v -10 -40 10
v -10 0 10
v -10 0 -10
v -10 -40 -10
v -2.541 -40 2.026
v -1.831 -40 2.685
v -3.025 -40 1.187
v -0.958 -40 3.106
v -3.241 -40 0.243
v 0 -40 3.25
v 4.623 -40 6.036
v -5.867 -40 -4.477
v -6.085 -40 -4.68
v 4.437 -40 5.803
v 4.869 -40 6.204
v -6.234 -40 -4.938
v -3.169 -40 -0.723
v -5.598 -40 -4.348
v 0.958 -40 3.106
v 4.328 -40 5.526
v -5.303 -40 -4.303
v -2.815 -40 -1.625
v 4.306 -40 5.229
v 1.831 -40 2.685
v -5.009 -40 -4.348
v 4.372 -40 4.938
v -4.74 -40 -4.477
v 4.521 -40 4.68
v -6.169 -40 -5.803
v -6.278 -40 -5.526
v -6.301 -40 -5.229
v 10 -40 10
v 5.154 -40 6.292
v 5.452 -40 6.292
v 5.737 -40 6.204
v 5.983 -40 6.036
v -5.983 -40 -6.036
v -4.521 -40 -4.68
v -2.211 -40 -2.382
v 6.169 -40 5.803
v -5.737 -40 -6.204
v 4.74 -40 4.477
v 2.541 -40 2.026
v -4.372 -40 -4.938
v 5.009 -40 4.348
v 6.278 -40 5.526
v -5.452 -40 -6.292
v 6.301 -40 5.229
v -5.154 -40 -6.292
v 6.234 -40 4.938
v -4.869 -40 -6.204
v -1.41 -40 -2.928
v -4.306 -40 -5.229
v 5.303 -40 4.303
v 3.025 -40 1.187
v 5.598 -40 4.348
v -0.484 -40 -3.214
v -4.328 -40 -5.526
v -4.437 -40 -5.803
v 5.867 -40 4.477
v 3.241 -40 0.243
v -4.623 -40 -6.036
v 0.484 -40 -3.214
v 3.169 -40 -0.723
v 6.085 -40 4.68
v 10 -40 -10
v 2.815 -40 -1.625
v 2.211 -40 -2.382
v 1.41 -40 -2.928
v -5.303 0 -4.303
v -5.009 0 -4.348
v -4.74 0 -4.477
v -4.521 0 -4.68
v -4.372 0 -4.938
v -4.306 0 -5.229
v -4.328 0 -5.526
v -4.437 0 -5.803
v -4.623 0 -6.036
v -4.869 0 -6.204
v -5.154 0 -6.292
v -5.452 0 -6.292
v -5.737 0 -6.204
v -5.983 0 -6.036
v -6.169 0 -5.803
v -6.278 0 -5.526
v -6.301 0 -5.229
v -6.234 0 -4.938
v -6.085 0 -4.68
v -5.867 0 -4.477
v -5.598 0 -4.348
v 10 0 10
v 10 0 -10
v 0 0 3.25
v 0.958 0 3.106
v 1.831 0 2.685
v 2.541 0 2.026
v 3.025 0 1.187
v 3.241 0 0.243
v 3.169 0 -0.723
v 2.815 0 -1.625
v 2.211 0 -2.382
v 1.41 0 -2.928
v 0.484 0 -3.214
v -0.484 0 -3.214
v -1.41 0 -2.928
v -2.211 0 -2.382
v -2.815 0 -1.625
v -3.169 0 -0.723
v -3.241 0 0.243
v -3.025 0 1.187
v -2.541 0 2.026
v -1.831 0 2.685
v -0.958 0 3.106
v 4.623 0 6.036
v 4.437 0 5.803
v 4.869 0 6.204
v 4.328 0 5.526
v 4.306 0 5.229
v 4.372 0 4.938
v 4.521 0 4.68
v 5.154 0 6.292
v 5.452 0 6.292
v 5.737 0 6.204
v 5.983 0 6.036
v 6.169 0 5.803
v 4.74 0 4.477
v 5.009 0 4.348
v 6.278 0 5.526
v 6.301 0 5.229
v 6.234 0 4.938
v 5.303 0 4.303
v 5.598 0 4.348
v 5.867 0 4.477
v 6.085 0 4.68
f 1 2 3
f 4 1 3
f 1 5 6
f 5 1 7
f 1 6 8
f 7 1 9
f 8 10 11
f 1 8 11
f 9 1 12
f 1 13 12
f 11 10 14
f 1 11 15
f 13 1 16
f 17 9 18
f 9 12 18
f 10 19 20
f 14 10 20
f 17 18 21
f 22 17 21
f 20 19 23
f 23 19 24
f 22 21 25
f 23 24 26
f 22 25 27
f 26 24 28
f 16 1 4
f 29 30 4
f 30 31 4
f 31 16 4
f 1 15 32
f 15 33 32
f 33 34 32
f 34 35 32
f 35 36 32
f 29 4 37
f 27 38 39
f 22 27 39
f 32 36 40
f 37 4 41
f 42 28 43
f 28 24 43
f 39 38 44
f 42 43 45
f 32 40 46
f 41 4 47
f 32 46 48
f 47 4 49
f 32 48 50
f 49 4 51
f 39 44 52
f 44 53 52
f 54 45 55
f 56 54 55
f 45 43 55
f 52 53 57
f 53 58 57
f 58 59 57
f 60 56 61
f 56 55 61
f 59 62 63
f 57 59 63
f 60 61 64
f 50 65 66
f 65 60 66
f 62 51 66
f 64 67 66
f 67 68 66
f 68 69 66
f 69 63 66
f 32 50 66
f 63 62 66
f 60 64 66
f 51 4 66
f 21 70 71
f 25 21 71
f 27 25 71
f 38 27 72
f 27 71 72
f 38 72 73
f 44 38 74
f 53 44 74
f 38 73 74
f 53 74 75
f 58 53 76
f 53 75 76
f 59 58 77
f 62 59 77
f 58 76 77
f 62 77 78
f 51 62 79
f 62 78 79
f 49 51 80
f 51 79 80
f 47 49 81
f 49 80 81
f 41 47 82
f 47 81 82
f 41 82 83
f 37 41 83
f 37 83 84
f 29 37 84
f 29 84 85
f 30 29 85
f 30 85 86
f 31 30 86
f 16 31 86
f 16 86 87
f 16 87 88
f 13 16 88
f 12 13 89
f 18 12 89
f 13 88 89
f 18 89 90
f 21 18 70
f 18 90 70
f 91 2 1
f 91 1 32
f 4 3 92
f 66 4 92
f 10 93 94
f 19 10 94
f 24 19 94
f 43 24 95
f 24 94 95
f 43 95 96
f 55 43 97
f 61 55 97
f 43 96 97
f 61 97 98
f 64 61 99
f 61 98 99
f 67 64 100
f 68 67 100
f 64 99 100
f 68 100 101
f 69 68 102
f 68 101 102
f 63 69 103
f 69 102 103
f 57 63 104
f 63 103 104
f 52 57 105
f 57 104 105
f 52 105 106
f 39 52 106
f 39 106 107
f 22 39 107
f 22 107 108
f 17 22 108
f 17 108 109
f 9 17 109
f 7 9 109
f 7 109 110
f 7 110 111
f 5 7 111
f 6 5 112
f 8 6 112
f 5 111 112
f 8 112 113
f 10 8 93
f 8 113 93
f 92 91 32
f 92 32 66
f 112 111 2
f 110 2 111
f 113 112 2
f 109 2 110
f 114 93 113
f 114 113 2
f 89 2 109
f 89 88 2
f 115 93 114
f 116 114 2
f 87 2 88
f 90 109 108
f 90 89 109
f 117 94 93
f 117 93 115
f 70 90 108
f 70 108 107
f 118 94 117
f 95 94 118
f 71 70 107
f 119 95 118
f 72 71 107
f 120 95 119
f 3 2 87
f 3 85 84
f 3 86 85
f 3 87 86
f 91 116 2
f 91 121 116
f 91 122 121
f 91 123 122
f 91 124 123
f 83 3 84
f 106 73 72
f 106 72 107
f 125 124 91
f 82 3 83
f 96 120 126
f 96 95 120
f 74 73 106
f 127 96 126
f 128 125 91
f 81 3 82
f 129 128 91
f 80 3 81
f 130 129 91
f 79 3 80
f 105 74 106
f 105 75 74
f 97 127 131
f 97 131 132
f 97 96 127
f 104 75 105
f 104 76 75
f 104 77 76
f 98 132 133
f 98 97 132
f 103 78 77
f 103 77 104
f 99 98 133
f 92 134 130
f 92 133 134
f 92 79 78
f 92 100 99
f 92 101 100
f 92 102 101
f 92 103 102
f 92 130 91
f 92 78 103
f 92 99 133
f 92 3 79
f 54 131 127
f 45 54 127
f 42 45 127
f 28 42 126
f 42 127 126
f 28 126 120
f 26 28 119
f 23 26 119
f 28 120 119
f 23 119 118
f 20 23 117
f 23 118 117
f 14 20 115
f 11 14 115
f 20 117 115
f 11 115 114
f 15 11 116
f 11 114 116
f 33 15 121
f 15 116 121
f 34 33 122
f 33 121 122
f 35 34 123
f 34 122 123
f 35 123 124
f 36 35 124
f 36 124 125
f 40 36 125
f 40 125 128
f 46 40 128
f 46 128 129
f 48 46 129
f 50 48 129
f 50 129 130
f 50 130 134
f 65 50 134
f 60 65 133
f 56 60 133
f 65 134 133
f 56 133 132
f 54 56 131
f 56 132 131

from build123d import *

# Parameters (mm, degrees)
ESQUISSE1_W        = 20
ESQUISSE1_H        = 20
ESQUISSE1_R        = 1
ESQUISSE1_R_2      = 3.25
BOSS_EXTRU_1_DEPTH = 40


with BuildPart() as part:
    # Esquisse1 → Boss.-Extru.1 (new body)
    with BuildSketch(Plane(origin=(0, 0, 0), x_dir=(1, 0, 0), z_dir=(0, 1, 0))):
        Rectangle(ESQUISSE1_W, ESQUISSE1_H)
        with Locations(Location((-5.303300859, 5.303300859, 0), (0, 0, 270))):
            Circle(ESQUISSE1_R, mode=Mode.SUBTRACT)
        with Locations(Location((5.303300859, -5.303300859, 0), (0, 0, 90))):
            Circle(ESQUISSE1_R, mode=Mode.SUBTRACT)
        with Locations(Location((0, 0, 0), (0, 0, 270))):
            Circle(ESQUISSE1_R_2, mode=Mode.SUBTRACT)
    extrude(amount=-BOSS_EXTRU_1_DEPTH)


solid = part.part
